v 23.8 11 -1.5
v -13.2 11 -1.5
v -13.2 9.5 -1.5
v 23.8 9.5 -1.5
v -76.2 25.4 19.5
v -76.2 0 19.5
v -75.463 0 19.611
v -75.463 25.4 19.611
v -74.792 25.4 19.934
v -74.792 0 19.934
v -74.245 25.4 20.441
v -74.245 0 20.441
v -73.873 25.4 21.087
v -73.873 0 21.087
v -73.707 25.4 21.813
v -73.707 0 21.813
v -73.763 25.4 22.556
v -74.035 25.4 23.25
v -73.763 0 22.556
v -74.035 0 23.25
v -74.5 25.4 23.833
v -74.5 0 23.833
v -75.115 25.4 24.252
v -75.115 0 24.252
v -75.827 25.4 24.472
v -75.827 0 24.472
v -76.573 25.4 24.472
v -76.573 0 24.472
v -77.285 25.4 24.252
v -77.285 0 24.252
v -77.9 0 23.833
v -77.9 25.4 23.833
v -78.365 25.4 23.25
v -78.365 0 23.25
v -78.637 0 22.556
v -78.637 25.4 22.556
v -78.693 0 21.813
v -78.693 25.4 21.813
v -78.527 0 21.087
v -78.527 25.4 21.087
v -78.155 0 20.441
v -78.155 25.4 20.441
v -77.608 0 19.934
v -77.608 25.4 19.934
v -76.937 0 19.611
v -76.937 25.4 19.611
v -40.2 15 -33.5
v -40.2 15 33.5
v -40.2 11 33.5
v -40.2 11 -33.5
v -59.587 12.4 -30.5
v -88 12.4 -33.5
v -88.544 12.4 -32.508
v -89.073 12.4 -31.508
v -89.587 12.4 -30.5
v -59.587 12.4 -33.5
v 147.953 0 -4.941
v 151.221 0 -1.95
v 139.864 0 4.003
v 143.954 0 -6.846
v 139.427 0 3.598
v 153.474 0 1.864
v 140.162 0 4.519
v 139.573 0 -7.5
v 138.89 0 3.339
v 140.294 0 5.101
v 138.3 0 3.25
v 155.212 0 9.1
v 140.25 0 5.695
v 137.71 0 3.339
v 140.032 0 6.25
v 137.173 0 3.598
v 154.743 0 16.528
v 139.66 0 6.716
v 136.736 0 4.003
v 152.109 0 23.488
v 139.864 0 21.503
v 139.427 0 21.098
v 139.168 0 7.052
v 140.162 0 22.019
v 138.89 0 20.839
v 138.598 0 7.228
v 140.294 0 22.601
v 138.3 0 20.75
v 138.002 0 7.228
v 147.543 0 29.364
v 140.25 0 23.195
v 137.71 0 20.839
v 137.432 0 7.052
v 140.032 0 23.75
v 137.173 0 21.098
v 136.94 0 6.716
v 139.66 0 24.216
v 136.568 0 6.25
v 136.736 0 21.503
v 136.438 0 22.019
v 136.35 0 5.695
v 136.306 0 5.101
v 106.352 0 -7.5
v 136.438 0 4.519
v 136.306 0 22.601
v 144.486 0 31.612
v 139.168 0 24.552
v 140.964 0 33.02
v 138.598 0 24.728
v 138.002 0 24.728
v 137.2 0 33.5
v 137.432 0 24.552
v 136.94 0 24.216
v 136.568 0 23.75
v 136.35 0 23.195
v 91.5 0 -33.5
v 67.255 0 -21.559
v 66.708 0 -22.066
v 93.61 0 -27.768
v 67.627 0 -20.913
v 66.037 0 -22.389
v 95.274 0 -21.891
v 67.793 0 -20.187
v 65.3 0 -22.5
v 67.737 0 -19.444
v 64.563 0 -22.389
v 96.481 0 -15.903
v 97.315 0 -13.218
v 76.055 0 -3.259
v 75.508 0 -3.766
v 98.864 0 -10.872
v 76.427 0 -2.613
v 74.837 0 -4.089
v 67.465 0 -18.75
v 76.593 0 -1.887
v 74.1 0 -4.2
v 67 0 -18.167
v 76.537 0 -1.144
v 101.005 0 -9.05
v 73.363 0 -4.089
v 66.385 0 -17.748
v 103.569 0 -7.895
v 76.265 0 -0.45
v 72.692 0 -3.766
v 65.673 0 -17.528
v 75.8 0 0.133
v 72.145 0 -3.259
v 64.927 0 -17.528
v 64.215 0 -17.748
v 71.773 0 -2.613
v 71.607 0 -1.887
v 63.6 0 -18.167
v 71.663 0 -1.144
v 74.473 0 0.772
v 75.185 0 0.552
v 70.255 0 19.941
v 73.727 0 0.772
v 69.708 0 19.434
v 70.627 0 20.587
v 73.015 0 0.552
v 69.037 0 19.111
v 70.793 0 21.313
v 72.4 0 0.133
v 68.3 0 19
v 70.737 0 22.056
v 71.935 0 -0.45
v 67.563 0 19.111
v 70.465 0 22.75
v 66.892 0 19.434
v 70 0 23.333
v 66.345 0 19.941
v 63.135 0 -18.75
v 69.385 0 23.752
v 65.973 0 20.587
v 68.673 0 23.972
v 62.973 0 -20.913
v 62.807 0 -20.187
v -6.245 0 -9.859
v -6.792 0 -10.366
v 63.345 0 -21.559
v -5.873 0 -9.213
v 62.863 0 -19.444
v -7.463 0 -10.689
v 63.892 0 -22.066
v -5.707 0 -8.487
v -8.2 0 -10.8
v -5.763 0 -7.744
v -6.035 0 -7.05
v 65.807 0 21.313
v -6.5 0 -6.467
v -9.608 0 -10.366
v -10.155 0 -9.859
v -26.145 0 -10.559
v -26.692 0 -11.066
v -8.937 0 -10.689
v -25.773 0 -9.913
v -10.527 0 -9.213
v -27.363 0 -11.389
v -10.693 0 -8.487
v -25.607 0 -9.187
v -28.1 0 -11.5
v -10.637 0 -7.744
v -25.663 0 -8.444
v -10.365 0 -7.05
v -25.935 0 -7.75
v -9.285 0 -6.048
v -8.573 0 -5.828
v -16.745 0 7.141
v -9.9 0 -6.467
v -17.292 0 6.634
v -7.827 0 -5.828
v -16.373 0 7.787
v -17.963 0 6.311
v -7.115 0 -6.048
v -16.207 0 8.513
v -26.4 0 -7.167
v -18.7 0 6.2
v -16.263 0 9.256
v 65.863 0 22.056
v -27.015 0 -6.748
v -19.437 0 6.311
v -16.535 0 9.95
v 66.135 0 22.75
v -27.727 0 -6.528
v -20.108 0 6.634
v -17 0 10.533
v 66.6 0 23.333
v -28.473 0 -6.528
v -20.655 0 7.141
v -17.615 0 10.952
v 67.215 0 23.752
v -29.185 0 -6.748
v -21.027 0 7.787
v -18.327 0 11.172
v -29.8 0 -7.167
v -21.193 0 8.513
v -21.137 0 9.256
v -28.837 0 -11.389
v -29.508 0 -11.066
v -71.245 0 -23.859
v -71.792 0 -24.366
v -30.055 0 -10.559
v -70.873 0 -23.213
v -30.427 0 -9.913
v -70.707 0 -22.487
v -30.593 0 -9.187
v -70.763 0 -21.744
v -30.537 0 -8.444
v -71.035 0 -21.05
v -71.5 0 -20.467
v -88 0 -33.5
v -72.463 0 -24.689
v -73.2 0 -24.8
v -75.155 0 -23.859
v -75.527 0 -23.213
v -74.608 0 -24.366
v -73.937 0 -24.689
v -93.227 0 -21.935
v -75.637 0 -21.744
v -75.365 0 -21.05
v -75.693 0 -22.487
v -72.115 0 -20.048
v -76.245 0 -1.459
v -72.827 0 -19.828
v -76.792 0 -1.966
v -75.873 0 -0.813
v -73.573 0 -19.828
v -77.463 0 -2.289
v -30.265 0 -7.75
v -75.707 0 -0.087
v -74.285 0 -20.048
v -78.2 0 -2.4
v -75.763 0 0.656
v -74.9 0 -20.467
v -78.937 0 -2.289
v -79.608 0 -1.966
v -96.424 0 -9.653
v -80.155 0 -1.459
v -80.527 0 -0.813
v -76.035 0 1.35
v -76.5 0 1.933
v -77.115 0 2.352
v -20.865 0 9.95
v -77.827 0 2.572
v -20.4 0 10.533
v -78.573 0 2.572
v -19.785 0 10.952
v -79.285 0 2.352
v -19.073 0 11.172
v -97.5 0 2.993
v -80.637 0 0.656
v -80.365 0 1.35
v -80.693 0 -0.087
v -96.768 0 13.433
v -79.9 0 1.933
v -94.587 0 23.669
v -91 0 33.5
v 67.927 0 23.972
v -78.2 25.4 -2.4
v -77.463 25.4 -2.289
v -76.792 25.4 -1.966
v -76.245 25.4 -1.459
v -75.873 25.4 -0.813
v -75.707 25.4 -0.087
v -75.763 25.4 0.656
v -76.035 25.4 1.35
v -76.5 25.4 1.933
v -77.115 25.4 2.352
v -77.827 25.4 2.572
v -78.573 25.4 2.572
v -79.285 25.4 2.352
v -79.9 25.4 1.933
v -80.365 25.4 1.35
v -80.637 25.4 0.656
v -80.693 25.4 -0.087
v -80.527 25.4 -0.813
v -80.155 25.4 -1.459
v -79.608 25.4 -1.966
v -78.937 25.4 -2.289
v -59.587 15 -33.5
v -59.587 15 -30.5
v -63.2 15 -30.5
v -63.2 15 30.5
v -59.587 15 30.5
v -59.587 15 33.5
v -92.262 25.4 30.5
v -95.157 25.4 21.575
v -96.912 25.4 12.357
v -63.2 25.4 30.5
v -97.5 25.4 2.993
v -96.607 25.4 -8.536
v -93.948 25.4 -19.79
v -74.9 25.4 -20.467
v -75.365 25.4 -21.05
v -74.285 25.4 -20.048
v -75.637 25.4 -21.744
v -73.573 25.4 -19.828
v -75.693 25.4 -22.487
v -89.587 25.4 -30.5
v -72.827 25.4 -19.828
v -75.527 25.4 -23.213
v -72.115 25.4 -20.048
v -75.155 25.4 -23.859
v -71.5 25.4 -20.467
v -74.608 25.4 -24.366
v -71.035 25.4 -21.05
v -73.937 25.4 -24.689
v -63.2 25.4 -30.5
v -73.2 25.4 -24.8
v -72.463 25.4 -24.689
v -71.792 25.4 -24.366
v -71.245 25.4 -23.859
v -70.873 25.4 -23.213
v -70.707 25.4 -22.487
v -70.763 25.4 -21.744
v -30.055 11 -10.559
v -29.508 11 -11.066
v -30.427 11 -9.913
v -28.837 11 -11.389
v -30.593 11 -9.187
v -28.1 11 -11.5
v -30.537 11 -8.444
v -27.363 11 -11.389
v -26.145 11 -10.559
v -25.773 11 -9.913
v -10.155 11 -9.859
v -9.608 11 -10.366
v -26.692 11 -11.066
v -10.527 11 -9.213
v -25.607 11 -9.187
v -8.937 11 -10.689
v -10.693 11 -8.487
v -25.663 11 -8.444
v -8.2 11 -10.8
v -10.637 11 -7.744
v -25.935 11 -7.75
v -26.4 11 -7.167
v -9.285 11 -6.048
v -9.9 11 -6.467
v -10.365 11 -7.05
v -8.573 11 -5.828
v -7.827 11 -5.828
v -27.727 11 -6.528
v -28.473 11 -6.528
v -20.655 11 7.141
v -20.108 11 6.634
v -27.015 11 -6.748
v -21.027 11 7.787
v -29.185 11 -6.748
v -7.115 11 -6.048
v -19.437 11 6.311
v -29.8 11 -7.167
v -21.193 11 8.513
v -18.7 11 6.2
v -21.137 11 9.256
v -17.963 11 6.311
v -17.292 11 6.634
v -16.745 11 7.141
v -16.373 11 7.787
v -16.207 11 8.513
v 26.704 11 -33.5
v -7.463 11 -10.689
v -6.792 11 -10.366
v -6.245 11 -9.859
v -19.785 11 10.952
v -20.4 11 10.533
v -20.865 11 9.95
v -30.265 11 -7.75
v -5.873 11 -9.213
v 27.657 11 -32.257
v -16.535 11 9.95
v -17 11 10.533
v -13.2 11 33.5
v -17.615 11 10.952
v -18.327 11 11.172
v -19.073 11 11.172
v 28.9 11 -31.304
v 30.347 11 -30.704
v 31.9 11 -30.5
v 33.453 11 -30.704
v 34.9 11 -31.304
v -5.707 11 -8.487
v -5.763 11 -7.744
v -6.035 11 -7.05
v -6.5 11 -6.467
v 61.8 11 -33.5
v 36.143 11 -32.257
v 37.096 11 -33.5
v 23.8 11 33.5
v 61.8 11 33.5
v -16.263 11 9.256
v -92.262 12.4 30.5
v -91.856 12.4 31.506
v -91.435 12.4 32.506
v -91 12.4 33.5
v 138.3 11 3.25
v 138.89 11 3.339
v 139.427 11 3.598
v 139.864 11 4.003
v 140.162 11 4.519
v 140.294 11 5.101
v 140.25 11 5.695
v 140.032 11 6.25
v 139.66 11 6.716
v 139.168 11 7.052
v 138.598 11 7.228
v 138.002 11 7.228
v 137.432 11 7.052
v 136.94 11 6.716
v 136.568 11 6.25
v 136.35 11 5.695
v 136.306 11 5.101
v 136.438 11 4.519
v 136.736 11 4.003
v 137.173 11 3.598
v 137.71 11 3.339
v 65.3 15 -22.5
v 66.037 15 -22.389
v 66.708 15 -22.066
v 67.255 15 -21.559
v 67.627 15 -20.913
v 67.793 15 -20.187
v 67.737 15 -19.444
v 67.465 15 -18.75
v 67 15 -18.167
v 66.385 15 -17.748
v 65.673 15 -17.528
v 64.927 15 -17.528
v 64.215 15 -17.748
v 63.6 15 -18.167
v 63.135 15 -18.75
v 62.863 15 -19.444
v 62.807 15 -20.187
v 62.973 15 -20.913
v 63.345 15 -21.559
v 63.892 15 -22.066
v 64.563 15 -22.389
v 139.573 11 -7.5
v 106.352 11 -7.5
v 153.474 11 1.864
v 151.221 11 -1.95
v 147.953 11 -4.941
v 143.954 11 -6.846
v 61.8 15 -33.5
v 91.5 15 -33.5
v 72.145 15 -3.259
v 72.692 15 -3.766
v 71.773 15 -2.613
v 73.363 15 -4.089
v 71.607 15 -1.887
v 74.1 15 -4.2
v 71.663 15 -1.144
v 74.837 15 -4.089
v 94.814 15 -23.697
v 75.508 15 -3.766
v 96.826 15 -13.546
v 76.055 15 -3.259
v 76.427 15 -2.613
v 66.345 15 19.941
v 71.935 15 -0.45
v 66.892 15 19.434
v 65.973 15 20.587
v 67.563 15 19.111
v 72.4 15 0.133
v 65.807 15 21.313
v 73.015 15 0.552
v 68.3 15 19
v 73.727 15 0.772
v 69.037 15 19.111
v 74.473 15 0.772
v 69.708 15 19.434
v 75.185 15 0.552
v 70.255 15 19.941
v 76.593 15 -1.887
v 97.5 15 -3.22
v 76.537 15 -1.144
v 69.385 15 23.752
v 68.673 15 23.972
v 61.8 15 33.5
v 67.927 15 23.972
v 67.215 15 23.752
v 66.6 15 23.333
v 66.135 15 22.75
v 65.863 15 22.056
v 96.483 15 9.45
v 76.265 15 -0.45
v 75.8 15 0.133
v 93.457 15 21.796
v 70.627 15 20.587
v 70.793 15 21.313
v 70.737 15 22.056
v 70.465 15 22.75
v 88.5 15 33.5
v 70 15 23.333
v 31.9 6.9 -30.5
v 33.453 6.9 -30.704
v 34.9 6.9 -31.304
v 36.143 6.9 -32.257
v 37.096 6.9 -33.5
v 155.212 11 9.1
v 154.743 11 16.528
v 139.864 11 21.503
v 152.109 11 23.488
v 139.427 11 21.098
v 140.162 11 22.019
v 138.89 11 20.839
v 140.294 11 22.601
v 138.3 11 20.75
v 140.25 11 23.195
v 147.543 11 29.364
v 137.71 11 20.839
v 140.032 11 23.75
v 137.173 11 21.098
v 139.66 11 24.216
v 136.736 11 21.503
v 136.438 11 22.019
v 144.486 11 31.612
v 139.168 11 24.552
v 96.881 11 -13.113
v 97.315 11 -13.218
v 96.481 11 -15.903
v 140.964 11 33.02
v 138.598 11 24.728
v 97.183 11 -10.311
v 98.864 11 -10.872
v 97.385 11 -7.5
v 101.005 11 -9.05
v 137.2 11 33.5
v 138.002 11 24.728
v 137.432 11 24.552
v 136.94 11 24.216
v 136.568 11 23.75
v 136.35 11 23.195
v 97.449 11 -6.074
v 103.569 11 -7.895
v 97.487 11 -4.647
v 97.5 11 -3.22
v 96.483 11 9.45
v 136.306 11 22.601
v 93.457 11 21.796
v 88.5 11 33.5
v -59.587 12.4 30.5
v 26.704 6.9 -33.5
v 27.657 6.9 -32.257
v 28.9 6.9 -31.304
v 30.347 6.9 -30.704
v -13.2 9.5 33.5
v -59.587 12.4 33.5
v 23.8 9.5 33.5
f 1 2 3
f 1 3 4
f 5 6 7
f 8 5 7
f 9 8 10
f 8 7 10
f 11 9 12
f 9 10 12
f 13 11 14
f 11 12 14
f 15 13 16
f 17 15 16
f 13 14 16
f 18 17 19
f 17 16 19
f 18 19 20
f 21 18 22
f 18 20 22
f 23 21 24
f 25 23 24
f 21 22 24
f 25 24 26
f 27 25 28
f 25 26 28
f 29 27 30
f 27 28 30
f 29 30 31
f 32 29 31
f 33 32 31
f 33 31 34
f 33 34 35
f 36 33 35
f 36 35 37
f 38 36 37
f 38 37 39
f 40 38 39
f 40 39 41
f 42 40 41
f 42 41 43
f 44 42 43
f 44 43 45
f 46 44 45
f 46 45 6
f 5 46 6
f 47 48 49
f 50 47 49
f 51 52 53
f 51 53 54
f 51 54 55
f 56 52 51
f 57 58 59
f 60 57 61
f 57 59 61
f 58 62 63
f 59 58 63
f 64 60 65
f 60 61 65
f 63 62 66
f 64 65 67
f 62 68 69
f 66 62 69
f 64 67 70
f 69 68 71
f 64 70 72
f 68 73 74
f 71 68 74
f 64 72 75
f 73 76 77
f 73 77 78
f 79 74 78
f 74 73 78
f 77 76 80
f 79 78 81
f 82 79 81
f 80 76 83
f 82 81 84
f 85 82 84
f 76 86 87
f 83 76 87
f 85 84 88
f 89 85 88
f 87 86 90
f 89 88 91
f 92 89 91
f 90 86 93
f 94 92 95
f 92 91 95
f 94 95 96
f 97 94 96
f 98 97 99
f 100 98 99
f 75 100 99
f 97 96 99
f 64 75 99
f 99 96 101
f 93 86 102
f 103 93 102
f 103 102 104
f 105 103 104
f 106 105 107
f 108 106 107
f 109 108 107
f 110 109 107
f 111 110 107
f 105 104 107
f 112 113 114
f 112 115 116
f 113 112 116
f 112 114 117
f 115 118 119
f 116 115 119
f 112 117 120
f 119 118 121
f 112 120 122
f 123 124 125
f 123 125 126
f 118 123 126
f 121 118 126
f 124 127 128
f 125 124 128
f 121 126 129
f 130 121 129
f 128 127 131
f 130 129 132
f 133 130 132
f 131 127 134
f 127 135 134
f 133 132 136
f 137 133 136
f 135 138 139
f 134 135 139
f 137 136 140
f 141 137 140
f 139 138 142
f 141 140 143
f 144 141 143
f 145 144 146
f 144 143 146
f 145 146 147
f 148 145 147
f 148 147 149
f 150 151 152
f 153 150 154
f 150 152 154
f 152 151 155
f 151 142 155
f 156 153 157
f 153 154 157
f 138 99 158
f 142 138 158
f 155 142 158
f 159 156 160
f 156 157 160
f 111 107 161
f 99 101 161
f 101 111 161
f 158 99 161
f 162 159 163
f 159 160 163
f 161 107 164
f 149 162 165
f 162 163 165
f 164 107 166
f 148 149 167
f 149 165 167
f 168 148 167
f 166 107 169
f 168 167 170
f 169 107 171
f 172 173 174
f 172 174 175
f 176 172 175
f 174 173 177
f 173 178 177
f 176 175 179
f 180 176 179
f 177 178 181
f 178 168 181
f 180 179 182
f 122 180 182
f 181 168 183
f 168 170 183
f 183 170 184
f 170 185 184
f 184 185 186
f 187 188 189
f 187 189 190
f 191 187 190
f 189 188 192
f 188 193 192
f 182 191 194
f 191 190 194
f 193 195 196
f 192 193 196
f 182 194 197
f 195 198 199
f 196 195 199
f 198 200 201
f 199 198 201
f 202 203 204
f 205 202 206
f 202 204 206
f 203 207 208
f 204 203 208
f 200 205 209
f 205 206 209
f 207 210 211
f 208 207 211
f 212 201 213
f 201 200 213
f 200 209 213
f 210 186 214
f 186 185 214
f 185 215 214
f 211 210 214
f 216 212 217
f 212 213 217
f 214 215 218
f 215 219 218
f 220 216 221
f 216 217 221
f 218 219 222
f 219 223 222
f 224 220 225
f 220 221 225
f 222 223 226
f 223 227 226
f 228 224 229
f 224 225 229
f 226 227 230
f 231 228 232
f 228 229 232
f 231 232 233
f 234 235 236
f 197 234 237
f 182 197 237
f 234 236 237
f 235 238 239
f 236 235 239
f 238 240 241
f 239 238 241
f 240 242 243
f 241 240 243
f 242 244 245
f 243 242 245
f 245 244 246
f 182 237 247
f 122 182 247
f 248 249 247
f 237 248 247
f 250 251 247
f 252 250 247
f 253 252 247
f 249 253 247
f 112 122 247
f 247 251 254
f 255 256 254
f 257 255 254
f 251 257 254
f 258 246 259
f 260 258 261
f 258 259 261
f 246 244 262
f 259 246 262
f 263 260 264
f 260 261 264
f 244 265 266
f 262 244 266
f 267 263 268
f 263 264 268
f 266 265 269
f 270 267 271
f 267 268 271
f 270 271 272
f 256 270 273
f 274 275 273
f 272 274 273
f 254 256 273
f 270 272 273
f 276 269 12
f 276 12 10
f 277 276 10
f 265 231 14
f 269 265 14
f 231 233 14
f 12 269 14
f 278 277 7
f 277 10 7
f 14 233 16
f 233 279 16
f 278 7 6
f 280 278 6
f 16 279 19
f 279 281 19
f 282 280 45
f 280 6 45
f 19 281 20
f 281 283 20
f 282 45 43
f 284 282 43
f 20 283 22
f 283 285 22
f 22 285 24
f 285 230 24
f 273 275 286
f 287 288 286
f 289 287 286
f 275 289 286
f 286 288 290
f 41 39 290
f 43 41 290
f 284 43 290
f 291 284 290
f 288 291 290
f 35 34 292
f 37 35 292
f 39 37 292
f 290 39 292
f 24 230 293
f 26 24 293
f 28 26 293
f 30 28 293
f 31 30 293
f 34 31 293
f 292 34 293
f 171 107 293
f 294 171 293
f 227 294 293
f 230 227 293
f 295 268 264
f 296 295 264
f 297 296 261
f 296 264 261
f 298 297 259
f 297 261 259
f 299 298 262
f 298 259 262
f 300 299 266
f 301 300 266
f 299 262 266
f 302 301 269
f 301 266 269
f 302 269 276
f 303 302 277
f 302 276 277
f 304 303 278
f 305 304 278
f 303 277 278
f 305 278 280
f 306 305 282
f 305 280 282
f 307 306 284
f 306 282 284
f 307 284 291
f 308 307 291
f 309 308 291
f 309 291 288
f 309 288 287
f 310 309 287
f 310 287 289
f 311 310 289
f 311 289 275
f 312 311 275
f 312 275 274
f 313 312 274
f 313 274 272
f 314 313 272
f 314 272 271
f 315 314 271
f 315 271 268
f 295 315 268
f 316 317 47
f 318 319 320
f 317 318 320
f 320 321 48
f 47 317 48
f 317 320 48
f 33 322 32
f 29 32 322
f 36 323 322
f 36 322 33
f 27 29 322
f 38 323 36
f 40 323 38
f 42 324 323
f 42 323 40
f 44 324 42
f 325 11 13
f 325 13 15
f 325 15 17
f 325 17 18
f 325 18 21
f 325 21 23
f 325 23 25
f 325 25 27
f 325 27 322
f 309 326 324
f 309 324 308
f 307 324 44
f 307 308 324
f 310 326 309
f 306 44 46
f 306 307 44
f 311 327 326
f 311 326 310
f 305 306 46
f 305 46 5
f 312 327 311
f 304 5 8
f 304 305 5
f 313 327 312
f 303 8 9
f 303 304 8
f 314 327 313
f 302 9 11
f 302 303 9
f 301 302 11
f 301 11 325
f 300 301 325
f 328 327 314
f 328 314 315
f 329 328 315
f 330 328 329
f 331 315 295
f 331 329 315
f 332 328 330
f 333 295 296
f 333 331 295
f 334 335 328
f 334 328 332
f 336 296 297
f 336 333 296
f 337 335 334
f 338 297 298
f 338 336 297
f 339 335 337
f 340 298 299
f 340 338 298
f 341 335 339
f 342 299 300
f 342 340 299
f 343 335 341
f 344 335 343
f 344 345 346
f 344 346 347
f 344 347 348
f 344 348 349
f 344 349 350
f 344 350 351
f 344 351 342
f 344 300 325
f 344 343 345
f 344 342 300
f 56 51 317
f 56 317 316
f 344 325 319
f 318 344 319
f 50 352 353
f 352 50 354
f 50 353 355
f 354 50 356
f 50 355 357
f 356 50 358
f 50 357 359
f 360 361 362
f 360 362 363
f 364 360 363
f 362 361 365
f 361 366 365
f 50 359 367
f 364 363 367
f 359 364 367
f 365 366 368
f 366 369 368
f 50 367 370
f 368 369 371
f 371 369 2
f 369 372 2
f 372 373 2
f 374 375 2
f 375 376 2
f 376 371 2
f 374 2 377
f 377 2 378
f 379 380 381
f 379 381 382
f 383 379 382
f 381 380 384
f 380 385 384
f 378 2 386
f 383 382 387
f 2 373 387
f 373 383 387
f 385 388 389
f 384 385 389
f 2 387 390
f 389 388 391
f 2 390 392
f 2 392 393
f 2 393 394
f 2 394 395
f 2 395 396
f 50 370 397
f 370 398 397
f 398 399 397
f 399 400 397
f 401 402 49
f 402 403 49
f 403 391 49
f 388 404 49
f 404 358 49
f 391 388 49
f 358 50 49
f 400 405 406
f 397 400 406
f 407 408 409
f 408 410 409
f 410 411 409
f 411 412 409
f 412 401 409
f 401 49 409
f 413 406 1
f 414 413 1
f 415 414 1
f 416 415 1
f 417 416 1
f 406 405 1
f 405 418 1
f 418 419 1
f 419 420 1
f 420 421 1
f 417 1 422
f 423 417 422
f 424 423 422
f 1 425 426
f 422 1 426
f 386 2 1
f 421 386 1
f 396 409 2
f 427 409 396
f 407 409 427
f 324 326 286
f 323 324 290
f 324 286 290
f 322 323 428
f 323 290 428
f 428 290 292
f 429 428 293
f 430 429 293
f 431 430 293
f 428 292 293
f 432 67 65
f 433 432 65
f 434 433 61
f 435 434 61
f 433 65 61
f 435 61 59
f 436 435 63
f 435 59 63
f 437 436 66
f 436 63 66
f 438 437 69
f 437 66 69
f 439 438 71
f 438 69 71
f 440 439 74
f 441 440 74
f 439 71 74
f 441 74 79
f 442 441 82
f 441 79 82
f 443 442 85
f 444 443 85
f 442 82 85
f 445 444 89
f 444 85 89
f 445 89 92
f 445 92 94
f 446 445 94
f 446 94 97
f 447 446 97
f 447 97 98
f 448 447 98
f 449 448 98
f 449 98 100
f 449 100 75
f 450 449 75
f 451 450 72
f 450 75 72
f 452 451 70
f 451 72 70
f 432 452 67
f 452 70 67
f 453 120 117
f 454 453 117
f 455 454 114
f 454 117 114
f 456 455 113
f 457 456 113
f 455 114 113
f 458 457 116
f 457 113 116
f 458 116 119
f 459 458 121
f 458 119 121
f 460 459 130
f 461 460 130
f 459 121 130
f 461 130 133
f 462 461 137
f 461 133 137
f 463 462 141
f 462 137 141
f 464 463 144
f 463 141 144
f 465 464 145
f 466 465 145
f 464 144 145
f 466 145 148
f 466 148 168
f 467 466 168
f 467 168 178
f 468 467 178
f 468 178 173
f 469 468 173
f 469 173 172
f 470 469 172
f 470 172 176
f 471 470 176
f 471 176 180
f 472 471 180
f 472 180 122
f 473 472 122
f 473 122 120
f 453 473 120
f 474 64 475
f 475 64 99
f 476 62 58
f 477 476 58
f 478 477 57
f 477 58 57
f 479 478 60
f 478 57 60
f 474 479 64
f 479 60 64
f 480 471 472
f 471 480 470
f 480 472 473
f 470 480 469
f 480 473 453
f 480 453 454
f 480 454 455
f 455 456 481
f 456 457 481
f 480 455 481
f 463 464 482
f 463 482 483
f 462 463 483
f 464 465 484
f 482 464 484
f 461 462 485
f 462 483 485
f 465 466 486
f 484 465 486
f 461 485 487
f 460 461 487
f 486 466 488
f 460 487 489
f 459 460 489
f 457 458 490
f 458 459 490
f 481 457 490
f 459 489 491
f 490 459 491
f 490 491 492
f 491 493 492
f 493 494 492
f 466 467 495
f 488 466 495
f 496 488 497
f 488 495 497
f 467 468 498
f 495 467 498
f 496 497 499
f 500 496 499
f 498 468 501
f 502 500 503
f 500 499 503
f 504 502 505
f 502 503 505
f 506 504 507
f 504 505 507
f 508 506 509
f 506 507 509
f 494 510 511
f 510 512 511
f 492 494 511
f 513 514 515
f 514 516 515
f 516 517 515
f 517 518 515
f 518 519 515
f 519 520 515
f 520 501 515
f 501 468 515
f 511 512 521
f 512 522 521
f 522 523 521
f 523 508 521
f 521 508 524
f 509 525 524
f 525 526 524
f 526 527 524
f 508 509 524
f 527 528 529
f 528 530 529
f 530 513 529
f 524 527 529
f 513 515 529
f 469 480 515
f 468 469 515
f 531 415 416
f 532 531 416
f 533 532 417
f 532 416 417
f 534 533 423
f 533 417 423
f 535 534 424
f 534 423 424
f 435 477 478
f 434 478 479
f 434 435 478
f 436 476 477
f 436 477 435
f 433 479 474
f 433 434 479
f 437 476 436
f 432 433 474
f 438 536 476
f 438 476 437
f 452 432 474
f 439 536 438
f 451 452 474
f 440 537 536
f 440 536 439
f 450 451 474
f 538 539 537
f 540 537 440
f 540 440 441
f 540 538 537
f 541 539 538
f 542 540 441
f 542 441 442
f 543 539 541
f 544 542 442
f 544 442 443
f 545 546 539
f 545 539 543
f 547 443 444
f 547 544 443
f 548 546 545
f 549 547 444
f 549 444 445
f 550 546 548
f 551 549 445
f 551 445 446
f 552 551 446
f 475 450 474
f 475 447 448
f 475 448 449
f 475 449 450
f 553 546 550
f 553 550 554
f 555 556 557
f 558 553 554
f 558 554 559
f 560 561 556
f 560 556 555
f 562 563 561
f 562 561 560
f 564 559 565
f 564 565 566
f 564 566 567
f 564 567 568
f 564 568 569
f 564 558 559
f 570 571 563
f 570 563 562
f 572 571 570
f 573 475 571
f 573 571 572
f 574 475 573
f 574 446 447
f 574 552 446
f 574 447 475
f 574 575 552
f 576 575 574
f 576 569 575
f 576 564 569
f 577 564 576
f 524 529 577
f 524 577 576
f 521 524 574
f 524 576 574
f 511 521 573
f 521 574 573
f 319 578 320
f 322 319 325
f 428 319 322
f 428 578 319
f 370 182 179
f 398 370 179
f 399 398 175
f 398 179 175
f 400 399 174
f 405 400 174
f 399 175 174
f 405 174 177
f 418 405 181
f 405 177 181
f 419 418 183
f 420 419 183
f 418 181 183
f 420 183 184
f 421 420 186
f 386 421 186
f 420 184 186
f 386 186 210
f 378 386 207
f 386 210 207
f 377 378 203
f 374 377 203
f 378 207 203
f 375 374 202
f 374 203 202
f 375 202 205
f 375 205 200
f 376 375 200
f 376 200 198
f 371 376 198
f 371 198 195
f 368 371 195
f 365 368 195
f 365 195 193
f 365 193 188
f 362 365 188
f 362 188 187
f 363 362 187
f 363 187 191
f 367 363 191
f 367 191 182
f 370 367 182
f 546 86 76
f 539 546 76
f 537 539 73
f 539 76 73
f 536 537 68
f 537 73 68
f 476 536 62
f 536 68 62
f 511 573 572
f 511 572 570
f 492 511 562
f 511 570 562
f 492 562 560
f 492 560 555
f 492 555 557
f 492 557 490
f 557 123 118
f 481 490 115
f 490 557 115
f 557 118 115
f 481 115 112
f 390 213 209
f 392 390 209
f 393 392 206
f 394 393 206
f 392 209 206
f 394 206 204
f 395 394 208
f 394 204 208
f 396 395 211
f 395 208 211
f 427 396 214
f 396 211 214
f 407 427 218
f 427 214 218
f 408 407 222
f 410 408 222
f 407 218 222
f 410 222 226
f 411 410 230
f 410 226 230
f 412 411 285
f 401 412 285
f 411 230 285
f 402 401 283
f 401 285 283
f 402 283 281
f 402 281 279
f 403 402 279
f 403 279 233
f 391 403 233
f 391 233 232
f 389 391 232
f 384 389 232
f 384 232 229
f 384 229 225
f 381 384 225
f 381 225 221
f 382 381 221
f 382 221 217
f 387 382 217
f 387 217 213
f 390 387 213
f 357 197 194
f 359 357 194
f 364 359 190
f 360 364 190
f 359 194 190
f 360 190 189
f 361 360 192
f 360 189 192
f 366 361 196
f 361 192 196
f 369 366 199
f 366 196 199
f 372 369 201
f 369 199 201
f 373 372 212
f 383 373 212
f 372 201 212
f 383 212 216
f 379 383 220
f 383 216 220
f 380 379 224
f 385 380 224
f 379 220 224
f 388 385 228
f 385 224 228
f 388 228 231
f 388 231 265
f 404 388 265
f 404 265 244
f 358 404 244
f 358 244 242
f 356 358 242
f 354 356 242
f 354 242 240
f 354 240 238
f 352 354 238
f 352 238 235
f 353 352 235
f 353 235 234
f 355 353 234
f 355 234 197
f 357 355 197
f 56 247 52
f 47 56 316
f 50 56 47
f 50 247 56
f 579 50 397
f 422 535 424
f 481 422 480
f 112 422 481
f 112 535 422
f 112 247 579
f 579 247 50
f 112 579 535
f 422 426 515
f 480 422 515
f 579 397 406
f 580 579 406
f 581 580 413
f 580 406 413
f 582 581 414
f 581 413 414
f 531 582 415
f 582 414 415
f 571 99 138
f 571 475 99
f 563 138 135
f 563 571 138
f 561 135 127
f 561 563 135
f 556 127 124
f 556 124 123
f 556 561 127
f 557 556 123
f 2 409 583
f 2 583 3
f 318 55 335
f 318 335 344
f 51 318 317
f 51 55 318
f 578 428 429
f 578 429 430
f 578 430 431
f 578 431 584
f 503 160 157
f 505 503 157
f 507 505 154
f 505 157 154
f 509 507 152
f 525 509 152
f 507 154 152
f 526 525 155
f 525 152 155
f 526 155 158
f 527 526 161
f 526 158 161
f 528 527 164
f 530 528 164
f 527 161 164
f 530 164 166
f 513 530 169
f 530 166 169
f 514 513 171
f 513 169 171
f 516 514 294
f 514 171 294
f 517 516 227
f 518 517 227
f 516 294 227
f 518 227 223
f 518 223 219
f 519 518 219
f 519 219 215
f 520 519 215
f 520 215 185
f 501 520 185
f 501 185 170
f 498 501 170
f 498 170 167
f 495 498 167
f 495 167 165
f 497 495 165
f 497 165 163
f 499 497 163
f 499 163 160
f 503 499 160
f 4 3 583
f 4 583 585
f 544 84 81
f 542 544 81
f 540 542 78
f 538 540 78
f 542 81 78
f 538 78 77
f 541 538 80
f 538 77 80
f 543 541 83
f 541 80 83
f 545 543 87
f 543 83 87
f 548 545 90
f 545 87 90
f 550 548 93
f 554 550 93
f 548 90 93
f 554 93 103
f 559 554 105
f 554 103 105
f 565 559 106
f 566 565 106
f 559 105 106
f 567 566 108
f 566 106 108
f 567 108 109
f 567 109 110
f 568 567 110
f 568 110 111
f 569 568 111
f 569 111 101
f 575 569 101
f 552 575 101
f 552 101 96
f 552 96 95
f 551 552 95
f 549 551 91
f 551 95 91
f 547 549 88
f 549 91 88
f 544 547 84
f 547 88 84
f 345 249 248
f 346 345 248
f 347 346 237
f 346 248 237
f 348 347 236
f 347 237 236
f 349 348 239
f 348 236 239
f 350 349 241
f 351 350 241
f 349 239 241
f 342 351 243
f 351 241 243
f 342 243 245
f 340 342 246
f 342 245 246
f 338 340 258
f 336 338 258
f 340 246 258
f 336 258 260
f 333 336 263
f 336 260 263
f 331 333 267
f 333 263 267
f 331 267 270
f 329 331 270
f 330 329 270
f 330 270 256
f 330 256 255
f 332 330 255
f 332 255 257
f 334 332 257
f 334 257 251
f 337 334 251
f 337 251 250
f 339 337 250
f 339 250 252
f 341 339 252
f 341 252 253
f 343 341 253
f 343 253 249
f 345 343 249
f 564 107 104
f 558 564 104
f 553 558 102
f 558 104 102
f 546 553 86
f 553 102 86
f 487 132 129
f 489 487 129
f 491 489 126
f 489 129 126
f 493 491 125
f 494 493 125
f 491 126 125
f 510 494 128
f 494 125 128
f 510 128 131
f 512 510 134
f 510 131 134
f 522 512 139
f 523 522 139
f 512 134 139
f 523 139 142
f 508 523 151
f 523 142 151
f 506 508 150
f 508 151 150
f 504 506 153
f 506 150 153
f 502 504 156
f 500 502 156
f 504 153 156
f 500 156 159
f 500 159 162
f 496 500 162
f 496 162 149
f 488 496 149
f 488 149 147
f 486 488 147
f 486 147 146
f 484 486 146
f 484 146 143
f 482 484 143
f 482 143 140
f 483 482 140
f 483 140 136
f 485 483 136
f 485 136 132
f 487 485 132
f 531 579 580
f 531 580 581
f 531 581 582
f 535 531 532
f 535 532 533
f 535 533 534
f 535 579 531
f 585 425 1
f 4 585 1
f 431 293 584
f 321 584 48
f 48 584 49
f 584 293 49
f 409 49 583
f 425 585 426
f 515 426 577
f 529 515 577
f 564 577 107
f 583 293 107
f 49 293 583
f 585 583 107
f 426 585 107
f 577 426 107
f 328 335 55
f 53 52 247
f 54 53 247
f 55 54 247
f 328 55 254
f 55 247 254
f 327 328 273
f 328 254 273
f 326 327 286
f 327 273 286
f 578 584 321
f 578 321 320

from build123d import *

# Parameters (mm, degrees)
SKETCH1_W           = 195
SKETCH1_H           = 67
BOSS_EXTRUDE1_DEPTH = 25.4
CUT_EXTRUDE1_DEPTH  = 107.177492907
CUT_EXTRUDE2_DEPTH  = 121.997561959
CUT_EXTRUDE3_START  = -13
SKETCH4_W           = 3.612655346
SKETCH4_H           = 3
CUT_EXTRUDE3_DEPTH  = 13
SKETCH6_R           = 2.5
CUT_EXTRUDE4_DEPTH  = 107.177492907
SKETCH7_W           = 37
SKETCH7_H           = 35
CUT_EXTRUDE5_DEPTH  = 1.5
CUT_EXTRUDE6_DEPTH  = 18.5
SKETCH9_R           = 2
BOSS_EXTRUDE2_DEPTH = 11
FILLET1_R           = 10


with BuildPart() as part:
    # Sketch1 → Boss-Extrude1 (new body)
    with BuildSketch(Plane(origin=(0, 0, 0), x_dir=(1, 0, 0), z_dir=(0, 1, 0))):
        Rectangle(SKETCH1_W, SKETCH1_H)
    extrude(amount=BOSS_EXTRUDE1_DEPTH)

    # Sketch2 → Cut-Extrude1 (cut, through all)
    with BuildSketch(Plane.XZ):
        with BuildLine():
            Line((97.5, -3.219751644), (97.5, 33.5))
            Line((97.5, 33.5), (88.5, 33.5))
            ThreePointArc((88.5, 33.5), (95.217186872, 15.683556008), (97.5, -3.219751644))
        make_face()
        with BuildLine():
            Line((97.5, -33.5), (97.5, -3.219751644))
            ThreePointArc((97.5, -3.219751644), (95.985558513, -18.65423771), (91.5, -33.5))
            Line((91.5, -33.5), (97.5, -33.5))
        make_face()
        with BuildLine():
            ThreePointArc((-88, -33.5), (-95.08607052, -15.861694529), (-97.5, 2.992884749))
            Line((-97.5, 2.992884749), (-97.5, -33.5))
            Line((-97.5, -33.5), (-88, -33.5))
        make_face()
        with BuildLine():
            ThreePointArc((-97.5, 2.992884749), (-95.856964648, 18.588830376), (-91, 33.5))
            Line((-91, 33.5), (-97.5, 33.5))
            Line((-97.5, 33.5), (-97.5, 2.992884749))
        make_face()
    extrude(amount=-CUT_EXTRUDE1_DEPTH, mode=Mode.SUBTRACT)

    # Sketch3 → Cut-Extrude2 (cut, through all)
    with BuildSketch(Plane(origin=(0, 0, 33.5), x_dir=(-1, 0, 0), z_dir=(0, 0, -1))):
        Polygon((63.2, 25.4), (63.2, 15), (40.2, 15), (40.2, 11), (-61.8, 11), (-61.8, 15), (-97.5, 15), (-97.5, 25.4), align=None)
    extrude(amount=CUT_EXTRUDE2_DEPTH, mode=Mode.SUBTRACT)

    # Sketch4 → Cut-Extrude3 (cut)
    with BuildSketch(Plane(origin=(0, 25.4, 0), x_dir=(1, 0, 0), z_dir=(0, 1, 0)).offset(CUT_EXTRUDE3_START)):
        with BuildLine():
            Line((-63.2, 30.5), (-63.2, 33.5))
            Line((-63.2, 33.5), (-88, 33.5))
            ThreePointArc((-88, 33.5), (-88.810680862, 32.008999469), (-89.587344654, 30.5))
            Line((-89.587344654, 30.5), (-63.2, 30.5))
        make_face()
        with Locations((-61.393672327, 32)):
            Rectangle(SKETCH4_W, SKETCH4_H)
        with BuildLine():
            Line((-63.2, -33.5), (-63.2, -30.5))
            Line((-63.2, -30.5), (-92.261692194, -30.5))
            ThreePointArc((-92.261692194, -30.5), (-91.647155152, -32.006859002), (-91, -33.5))
            Line((-91, -33.5), (-63.2, -33.5))
        make_face()
        with Locations((-61.393672327, -32)):
            Rectangle(SKETCH4_W, SKETCH4_H)
    extrude(amount=CUT_EXTRUDE3_DEPTH, mode=Mode.SUBTRACT)

    # Sketch6 → Cut-Extrude4 (cut, through all)
    with BuildSketch(Plane.XZ):
        with Locations(Location((-28.1, -9, 0), (0, 0, 270))):
            Circle(SKETCH6_R)
        with Locations(Location((-8.2, -8.3, 0), (0, 0, 270))):
            Circle(SKETCH6_R)
        with Locations(Location((-18.7, 8.7, 0), (0, 0, 270))):
            Circle(SKETCH6_R)
        with Locations(Location((-76.2, 22, 0), (0, 0, 270))):
            Circle(SKETCH6_R)
        with Locations(Location((-78.2, 0.1, 0), (0, 0, 270))):
            Circle(SKETCH6_R)
        with Locations(Location((-73.2, -22.3, 0), (0, 0, 270))):
            Circle(SKETCH6_R)
        with Locations(Location((65.3, -20, 0), (0, 0, 270))):
            Circle(SKETCH6_R)
        with Locations(Location((74.1, -1.7, 0), (0, 0, 270))):
            Circle(SKETCH6_R)
        with Locations(Location((68.3, 21.5, 0), (0, 0, 270))):
            Circle(SKETCH6_R)
    extrude(amount=-CUT_EXTRUDE4_DEPTH, mode=Mode.SUBTRACT)

    # Sketch7 → Cut-Extrude5 (cut)
    with BuildSketch(Plane(origin=(0, 11, 0), x_dir=(1, 0, 0), z_dir=(0, 1, 0))):
        with Locations((5.3, -16)):
            Rectangle(SKETCH7_W, SKETCH7_H)
    extrude(amount=-CUT_EXTRUDE5_DEPTH, mode=Mode.SUBTRACT)

    # Sketch8 → Cut-Extrude6 (cut)
    with BuildSketch(Plane(origin=(0, 25.4, 0), x_dir=(1, 0, 0), z_dir=(0, 1, 0))):
        with BuildLine():
            Line((37.096152423, 33.5), (31.9, 33.5))
            Line((31.9, 33.5), (31.9, 30.5))
            ThreePointArc((31.9, 30.5), (34.9, 31.303847577), (37.096152423, 33.5))
        make_face()
        with BuildLine():
            Line((31.9, 33.5), (26.703847577, 33.5))
            ThreePointArc((26.703847577, 33.5), (28.9, 31.303847577), (31.9, 30.5))
            Line((31.9, 30.5), (31.9, 33.5))
        make_face()
    extrude(amount=-CUT_EXTRUDE6_DEPTH, mode=Mode.SUBTRACT)

    # Sketch9 → Boss-Extrude2 (add)
    with BuildSketch(Plane.XZ):
        with BuildLine():
            Line((88.5, 33.5), (137.200361796, 33.5))
            ThreePointArc((137.200361796, 33.5), (142.769729546, 32.427747228), (147.542861296, 29.364285714))
            ThreePointArc((147.542861296, 29.364285714), (154.743476693, 16.527679502), (153.473750823, 1.864285714))
            ThreePointArc((153.473750823, 1.864285714), (147.953179578, -4.940573023), (139.572717606, -7.5))
            Line((139.572717606, -7.5), (97.384558849, -7.5))
            ThreePointArc((97.384558849, -7.5), (95.698800641, 13.597328658), (88.5, 33.5))
        make_face()
        with Locations(Location((138.3, 5.25, 0), (0, 0, 270))):
            Circle(SKETCH9_R, mode=Mode.SUBTRACT)
        with Locations(Location((138.3, 22.75, 0), (0, 0, 270))):
            Circle(SKETCH9_R, mode=Mode.SUBTRACT)
    extrude(amount=-BOSS_EXTRUDE2_DEPTH)

    # Fillet1
    fillet1_edges = [part.edges().sort_by_distance(p)[0] for p in [
        (97.384558849, 5.5, -7.5),
    ]]
    fillet(fillet1_edges, radius=FILLET1_R)


solid = part.part
